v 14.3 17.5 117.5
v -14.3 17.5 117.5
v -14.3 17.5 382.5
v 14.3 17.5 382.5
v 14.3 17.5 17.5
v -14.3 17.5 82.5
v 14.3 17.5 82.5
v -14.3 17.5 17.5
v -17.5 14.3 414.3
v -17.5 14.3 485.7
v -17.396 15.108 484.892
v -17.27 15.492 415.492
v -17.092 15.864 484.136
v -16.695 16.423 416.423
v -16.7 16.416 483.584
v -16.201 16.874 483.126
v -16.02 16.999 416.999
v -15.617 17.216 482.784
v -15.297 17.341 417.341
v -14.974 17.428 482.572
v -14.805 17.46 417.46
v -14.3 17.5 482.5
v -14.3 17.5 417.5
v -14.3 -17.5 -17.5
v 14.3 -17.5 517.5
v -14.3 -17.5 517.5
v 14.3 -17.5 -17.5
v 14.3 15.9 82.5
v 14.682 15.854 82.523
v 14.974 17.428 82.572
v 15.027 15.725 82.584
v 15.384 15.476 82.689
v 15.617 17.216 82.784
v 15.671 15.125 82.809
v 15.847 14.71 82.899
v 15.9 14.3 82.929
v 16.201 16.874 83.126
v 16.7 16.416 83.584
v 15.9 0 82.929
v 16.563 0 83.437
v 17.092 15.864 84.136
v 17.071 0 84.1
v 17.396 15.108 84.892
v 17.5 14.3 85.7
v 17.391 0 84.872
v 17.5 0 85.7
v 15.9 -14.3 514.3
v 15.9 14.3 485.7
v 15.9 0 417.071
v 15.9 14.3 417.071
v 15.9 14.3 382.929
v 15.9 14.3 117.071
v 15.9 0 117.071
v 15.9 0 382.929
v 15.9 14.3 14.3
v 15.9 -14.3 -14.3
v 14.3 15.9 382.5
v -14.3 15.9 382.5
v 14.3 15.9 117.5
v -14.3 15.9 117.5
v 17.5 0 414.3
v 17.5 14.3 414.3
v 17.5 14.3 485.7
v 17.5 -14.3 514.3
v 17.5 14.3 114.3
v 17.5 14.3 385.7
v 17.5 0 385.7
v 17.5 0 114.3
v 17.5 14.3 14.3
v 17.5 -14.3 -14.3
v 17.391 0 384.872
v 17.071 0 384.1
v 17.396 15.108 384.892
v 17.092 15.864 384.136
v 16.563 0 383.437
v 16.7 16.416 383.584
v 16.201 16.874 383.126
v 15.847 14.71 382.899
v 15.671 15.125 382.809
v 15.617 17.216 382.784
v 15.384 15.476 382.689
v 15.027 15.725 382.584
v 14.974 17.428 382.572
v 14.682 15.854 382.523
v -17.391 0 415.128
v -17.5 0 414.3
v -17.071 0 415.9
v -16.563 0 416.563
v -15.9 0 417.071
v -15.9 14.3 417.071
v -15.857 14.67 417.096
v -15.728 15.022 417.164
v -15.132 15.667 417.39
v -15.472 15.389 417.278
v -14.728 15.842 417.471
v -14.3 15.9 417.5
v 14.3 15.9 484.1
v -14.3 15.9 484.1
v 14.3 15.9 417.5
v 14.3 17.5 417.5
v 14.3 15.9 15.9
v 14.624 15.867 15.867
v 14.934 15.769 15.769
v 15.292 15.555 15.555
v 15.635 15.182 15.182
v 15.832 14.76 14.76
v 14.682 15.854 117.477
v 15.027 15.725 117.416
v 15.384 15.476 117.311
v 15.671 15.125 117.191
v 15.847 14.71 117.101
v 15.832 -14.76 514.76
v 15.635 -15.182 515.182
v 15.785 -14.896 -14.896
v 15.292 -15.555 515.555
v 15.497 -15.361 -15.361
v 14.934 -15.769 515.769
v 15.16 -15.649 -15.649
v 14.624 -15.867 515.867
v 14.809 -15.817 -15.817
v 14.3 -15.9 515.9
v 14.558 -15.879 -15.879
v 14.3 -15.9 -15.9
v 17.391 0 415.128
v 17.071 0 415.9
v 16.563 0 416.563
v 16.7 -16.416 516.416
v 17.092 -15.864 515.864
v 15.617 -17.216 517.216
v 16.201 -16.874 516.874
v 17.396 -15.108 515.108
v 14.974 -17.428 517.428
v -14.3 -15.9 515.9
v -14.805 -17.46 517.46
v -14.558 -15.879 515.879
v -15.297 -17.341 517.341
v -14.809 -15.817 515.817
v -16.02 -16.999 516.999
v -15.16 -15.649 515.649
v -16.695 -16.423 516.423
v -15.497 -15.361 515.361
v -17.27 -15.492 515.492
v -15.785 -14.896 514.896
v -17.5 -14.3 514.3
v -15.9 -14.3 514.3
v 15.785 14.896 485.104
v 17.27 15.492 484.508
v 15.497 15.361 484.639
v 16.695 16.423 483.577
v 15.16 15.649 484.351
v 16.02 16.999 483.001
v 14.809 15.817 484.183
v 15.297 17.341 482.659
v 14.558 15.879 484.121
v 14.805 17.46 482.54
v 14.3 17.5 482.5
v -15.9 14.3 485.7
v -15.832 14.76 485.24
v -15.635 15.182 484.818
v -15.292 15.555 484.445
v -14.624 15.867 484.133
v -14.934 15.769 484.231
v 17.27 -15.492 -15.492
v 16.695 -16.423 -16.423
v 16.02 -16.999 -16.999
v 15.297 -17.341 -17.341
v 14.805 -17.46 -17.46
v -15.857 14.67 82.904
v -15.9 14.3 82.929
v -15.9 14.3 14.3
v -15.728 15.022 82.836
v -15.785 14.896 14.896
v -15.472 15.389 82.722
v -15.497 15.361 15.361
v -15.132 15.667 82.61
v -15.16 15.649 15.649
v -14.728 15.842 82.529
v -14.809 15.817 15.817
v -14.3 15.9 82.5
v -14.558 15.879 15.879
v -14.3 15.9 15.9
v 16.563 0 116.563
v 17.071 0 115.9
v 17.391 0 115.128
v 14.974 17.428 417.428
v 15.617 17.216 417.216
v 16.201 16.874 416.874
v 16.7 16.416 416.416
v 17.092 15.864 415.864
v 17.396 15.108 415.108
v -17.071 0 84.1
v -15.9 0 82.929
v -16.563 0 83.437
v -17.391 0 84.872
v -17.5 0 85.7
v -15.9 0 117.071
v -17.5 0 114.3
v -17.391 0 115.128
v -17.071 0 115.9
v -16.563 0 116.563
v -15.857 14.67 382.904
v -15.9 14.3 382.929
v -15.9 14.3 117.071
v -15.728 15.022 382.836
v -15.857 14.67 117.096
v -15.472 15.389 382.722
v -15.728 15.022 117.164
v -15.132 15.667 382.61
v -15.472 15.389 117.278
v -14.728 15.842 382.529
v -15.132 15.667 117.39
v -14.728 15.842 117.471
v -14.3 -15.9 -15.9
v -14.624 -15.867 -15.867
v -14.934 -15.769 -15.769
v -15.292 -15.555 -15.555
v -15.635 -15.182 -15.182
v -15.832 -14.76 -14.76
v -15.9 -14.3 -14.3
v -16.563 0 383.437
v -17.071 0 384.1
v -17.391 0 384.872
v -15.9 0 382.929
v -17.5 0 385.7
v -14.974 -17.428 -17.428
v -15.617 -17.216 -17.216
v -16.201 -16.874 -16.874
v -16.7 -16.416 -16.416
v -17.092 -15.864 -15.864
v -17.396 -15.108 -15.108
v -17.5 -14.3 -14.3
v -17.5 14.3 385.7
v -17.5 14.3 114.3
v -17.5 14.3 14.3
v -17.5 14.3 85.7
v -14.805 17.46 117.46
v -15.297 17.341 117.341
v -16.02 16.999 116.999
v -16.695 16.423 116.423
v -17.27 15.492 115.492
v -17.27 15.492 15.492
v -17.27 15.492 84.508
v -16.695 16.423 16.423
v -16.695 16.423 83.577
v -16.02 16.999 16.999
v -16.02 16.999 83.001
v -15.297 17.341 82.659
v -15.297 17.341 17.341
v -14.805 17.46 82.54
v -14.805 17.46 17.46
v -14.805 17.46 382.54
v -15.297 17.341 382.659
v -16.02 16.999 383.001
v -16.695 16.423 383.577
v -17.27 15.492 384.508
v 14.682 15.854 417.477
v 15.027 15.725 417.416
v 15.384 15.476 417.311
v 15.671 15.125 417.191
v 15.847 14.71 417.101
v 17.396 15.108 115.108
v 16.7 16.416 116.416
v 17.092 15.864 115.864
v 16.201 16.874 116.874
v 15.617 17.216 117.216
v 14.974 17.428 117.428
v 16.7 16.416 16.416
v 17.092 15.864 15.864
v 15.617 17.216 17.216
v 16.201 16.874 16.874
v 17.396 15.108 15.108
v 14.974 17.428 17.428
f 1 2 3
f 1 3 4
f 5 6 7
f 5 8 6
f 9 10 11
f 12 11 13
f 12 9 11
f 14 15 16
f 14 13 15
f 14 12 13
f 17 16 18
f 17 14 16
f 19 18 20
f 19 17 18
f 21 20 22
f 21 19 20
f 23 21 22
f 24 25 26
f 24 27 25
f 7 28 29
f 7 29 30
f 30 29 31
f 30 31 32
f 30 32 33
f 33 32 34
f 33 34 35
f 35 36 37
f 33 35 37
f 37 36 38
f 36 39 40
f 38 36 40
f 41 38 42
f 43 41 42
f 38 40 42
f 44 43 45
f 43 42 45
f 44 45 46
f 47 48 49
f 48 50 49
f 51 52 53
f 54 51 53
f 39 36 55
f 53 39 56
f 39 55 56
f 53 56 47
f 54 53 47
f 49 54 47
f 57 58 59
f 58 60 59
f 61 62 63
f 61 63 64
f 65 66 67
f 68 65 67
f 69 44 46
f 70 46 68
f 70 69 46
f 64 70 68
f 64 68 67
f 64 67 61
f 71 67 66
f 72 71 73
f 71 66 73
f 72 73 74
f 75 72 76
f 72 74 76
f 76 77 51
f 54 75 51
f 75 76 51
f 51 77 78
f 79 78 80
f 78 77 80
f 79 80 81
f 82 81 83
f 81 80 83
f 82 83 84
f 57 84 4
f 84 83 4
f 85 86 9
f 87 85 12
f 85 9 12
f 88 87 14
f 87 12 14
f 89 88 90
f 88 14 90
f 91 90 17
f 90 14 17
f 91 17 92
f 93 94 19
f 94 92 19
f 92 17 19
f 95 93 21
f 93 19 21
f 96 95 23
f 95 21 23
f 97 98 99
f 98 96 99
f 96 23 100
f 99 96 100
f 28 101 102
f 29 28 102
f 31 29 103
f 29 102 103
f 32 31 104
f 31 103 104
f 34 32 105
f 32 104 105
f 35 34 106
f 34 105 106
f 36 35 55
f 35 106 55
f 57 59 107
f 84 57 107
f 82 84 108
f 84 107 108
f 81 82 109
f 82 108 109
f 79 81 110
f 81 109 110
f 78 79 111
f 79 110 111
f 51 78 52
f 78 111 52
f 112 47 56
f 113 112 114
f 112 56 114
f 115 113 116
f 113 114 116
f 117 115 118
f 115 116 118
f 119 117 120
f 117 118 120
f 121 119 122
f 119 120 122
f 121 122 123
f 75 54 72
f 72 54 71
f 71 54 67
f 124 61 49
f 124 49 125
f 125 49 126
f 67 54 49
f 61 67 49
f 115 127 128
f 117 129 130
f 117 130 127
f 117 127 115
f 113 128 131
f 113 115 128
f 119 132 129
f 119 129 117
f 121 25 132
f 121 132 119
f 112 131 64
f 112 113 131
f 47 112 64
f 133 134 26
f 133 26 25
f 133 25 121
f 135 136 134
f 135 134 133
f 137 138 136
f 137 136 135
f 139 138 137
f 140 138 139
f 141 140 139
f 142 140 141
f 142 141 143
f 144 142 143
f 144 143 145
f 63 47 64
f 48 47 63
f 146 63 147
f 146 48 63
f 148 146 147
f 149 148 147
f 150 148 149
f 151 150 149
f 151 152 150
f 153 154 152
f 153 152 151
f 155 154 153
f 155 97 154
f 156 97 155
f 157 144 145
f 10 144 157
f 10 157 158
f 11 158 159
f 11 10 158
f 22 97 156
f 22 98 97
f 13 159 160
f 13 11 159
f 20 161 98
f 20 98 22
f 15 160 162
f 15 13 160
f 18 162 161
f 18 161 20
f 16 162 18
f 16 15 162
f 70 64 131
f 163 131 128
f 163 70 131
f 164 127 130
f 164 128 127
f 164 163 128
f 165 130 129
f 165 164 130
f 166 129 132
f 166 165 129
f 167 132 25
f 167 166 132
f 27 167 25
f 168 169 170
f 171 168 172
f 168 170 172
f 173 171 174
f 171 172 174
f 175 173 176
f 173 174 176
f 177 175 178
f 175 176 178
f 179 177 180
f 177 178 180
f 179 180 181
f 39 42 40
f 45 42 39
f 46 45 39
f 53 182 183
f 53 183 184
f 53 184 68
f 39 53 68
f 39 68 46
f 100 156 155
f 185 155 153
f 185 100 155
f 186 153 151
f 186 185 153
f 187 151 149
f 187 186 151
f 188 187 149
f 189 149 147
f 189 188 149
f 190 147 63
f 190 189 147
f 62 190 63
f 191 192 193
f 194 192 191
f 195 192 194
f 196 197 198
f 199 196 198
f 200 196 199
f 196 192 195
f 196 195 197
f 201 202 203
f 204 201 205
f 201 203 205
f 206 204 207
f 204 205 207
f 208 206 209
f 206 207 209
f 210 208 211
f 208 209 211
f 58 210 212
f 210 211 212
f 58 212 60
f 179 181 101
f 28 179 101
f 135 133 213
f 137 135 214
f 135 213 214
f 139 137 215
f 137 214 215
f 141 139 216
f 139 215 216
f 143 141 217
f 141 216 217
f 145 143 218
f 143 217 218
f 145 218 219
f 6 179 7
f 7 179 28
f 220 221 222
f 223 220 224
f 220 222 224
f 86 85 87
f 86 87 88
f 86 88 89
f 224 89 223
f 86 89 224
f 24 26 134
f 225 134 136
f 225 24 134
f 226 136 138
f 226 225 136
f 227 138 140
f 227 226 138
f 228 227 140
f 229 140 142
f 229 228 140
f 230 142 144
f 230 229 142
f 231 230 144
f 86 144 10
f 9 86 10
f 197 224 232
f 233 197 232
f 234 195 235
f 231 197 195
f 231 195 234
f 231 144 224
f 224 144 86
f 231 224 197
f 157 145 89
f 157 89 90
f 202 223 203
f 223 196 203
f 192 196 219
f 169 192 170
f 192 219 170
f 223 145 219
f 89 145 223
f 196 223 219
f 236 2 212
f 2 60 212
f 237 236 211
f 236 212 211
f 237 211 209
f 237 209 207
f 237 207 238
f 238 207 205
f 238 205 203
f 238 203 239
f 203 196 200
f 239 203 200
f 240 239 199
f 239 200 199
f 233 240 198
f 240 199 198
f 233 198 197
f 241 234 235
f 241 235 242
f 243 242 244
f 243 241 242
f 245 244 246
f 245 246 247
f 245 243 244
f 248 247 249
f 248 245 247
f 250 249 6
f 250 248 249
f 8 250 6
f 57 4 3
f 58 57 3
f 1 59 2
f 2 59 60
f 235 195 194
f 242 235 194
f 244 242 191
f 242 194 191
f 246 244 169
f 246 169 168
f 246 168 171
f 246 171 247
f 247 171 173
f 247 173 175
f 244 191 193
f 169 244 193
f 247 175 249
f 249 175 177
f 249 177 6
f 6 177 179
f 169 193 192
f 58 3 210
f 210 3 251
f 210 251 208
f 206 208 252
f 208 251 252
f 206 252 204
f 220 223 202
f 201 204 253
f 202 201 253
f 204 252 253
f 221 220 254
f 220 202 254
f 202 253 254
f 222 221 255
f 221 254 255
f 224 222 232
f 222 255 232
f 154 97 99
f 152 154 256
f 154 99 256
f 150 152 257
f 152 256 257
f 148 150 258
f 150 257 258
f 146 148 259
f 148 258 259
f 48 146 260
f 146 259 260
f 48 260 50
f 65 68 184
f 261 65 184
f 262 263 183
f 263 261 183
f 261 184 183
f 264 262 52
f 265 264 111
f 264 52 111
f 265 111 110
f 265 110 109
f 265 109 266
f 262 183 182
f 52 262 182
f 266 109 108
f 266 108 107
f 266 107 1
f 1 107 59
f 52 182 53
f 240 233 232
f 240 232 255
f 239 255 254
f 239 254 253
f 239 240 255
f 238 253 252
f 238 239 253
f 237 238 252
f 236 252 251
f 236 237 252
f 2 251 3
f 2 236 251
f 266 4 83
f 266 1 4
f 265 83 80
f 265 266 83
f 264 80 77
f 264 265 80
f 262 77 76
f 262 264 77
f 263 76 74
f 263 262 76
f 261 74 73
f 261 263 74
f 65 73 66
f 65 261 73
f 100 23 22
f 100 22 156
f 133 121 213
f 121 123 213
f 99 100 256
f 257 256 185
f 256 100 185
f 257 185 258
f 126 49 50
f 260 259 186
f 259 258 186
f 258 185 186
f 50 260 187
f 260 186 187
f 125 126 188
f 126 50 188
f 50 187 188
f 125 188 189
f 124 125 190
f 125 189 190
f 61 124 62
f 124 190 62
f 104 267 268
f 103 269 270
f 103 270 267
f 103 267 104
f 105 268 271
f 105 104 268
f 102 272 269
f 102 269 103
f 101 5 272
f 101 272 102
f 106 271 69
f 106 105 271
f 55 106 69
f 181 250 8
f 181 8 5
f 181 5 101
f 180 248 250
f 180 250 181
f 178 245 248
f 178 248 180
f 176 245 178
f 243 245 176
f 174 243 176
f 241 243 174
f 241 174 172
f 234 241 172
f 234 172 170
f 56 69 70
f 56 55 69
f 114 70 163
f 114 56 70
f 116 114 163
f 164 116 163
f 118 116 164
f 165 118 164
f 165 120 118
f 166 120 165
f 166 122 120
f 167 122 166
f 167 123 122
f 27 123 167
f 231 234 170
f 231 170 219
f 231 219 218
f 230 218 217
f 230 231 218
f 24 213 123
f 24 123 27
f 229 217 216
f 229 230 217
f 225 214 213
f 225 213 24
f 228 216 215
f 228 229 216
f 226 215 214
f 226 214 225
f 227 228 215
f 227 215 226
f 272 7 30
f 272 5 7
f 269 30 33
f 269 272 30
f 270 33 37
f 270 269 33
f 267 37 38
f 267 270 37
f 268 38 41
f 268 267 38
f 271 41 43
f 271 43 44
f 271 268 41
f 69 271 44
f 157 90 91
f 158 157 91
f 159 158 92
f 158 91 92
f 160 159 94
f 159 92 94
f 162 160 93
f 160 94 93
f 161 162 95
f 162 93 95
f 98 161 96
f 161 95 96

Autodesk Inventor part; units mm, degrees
ref_plane "Start plane" through (0, 0, -17.5) normal (0, 0, 1) x (1, 0, 0)
ref_plane "End plane" through (0, 0, 517.5) normal (0, 0, 1) x (1, 0, 0)
sketch "Sketch" plane through (0, 0, 0) normal (0, 0, 1) x (1, 0, 0)
  line L0 (-17.5, -14.3) -> (-17.5, 14.3)
  line L1 (-14.3, 17.5) -> (14.3, 17.5)
  line L2 (17.5, 14.3) -> (17.5, -14.3)
  line L3 (14.3, -17.5) -> (-14.3, -17.5)
  arc A0 (-17.5, -14.3) -> (-14.3, -17.5) centre (-14.3, -14.3) ccw
  arc A1 (-14.3, 17.5) -> (-17.5, 14.3) centre (-14.3, 14.3) ccw
  arc A2 (17.5, 14.3) -> (14.3, 17.5) centre (14.3, 14.3) ccw
  arc A3 (14.3, -17.5) -> (17.5, -14.3) centre (14.3, -14.3) ccw
  arc A4 (-14.3, 15.9) -> (-15.9, 14.3) centre (-14.3, 14.3) ccw
  line L4 (-14.3, 15.9) -> (14.3, 15.9)
  arc A5 (15.9, 14.3) -> (14.3, 15.9) centre (14.3, 14.3) ccw
  line L5 (15.9, 14.3) -> (15.9, -14.3)
  arc A6 (14.3, -15.9) -> (15.9, -14.3) centre (14.3, -14.3) ccw
  line L6 (14.3, -15.9) -> (-14.3, -15.9)
  arc A7 (-15.9, -14.3) -> (-14.3, -15.9) centre (-14.3, -14.3) ccw
  line L7 (-15.9, -14.3) -> (-15.9, 14.3)
  line L8 (0, 25.4278) -> (0, -25.4278) construction
  line L9 (-25.4278, 0) -> (25.4278, 0) construction
  dimension "d7" = 3.2
  dimension "d10" = 35
  dimension "d11" = 35
  dimension "d12" = 1.6
  dimension "d15" = 17.5
  dimension "d16" = 17.5
extrude "Body" add sketch "Sketch" along normal up to surface (535 mm away) from surface at -17.5
sketch "Sketch3" plane through (0, 0, 0) normal (0, 0, 1) x (1, 0, 0)
  line L0 (0, 0) -> (10, 0)
ref_plane "Work Plane3" through (0, 0, 0) normal (0, -1, 0) x (1, 0, 0)
sketch "Sketch4" plane through (0, 0, 0) normal (0, -1, 0) x (1, 0, 0)
  line L0 (-2, -17.5) -> (12, -17.5)
  line L1 (-2, 517.5) -> (12, 517.5)
  dimension "d18" = 535
ref_plane "Work Plane4" through (107.5, 0, -17.5) normal (0, 0, -1) x (-1, 0, 0)
split "Split1" plane through (107.5, 0, -17.5) removes the side toward (0, 0, -1)
ref_plane "Work Plane5" through (0, -17.5, 517.5) normal (0, 0.7071, 0.7071) x (1, 0, 0)
split "Split2" plane through (0, -17.5, 517.5) removes the side toward (0, 0.7071, 0.7071)
ref_plane "Work Plane7" through (0, 800, 400) normal (0, -1, 0) x (1, 0, 0)
ref_plane "Work Plane8" through (0, 0, 400) normal (0, -1, 0) x (1, 0, 0)
ref_plane "Work Plane9" through (0, 400, 400) normal (0, -1, 0) x (1, 0, 0)
ref_plane "Work Plane10" through (0, 0, 100) normal (0, 1, 0) x (-1, 0, 0)
ref_plane "Work Plane11" through (0, 800, 100) normal (0, 1, 0) x (-1, 0, 0)
ref_plane "Work Plane12" through (0, 400, 100) normal (0, 1, 0) x (-1, 0, 0)
sketch "Sketch5" plane through (0, 400, 400) normal (0, -1, 0) x (1, 0, 0)
  arc A0 (-17.5, -14.3) -> (-14.3, -17.5) centre (-14.3, -14.3) ccw
  line L0 (-17.5, -14.3) -> (-17.5, 14.3)
  arc A1 (-14.3, 17.5) -> (-17.5, 14.3) centre (-14.3, 14.3) ccw
  line L1 (-14.3, 17.5) -> (14.3, 17.5)
  arc A2 (17.5, 14.3) -> (14.3, 17.5) centre (14.3, 14.3) ccw
  line L2 (17.5, 14.3) -> (17.5, -14.3)
  arc A3 (14.3, -17.5) -> (17.5, -14.3) centre (14.3, -14.3) ccw
  line L3 (14.3, -17.5) -> (-14.3, -17.5)
  arc A4 (-14.3, 15.9) -> (-15.9, 14.3) centre (-14.3, 14.3) ccw
  line L4 (-14.3, 15.9) -> (14.3, 15.9)
  arc A5 (15.9, 14.3) -> (14.3, 15.9) centre (14.3, 14.3) ccw
  line L5 (15.9, 14.3) -> (15.9, -14.3)
  arc A6 (14.3, -15.9) -> (15.9, -14.3) centre (14.3, -14.3) ccw
  line L6 (14.3, -15.9) -> (-14.3, -15.9)
  arc A7 (-15.9, -14.3) -> (-14.3, -15.9) centre (-14.3, -14.3) ccw
  line L7 (-15.9, -14.3) -> (-15.9, 14.3)
extrude "Extrusion2" cut sketch "Sketch5" along normal up to surface (800 mm away) from surface at -400 contours L0 A1 L1 A2 L2 A3 L3 A0 | L4 A5 L5 A6 L6 A7 L7 A4
sketch "Sketch6" plane through (0, 400, 100) normal (0, 1, 0) x (-1, 0, 0)
  arc A0 (-17.5, -14.3) -> (-14.3, -17.5) centre (-14.3, -14.3) ccw
  line L0 (-17.5, -14.3) -> (-17.5, 14.3)
  arc A1 (-14.3, 17.5) -> (-17.5, 14.3) centre (-14.3, 14.3) ccw
  line L1 (-14.3, 17.5) -> (14.3, 17.5)
  arc A2 (17.5, 14.3) -> (14.3, 17.5) centre (14.3, 14.3) ccw
  line L2 (17.5, 14.3) -> (17.5, -14.3)
  arc A3 (14.3, -17.5) -> (17.5, -14.3) centre (14.3, -14.3) ccw
  line L3 (14.3, -17.5) -> (-14.3, -17.5)
  arc A4 (-14.3, 15.9) -> (-15.9, 14.3) centre (-14.3, 14.3) ccw
  line L4 (-14.3, 15.9) -> (14.3, 15.9)
  arc A5 (15.9, 14.3) -> (14.3, 15.9) centre (14.3, 14.3) ccw
  line L5 (15.9, 14.3) -> (15.9, -14.3)
  arc A6 (14.3, -15.9) -> (15.9, -14.3) centre (14.3, -14.3) ccw
  line L6 (14.3, -15.9) -> (-14.3, -15.9)
  arc A7 (-15.9, -14.3) -> (-14.3, -15.9) centre (-14.3, -14.3) ccw
  line L7 (-15.9, -14.3) -> (-15.9, 14.3)
extrude "Extrusion3" cut sketch "Sketch6" along normal up to surface (800 mm away) from surface at -400 contours L0 A1 L1 A2 L2 A3 L3 A0 | L4 A5 L5 A6 L6 A7 L7 A4
ref_plane "Work Plane13" through (0, -17.5, -17.5) normal (0, 0.7071, -0.7071) x (1, 0, 0)
split "Split4" plane through (0, -17.5, -17.5) removes the side toward (0, 0.7071, -0.7071)
equation "\"d7\" = G_IR"
equation "\"d10\" = G_H"
equation "\"d11\" = G_W"
equation "\"d12\" = G_T"
equation "\"d15\" = 0.5 * d10"
equation "\"d16\" = 0.5 * d11"
equation "\"d3\" = G_L"
equation "\"G_W\" = 35"
equation "\"G_H\" = 35"
equation "\"G_T\" = 1.6"
equation "\"G_IR\" = 3.2"
equation "\"G_L\" = d18"
equation "\"G_OFFSET_START\" = 17.5"
equation "\"G_OFFSET_END\" = 17.5"
equation "\"d13\" = -G_OFFSET_START"
equation "\"d14\" = G_OFFSET_END + B_L"
equation "\"B_L\" = 500"
properties part number "AS 1163 - C350L0 35x35x1.6 SHS - 535" material "Steel, Mild"
